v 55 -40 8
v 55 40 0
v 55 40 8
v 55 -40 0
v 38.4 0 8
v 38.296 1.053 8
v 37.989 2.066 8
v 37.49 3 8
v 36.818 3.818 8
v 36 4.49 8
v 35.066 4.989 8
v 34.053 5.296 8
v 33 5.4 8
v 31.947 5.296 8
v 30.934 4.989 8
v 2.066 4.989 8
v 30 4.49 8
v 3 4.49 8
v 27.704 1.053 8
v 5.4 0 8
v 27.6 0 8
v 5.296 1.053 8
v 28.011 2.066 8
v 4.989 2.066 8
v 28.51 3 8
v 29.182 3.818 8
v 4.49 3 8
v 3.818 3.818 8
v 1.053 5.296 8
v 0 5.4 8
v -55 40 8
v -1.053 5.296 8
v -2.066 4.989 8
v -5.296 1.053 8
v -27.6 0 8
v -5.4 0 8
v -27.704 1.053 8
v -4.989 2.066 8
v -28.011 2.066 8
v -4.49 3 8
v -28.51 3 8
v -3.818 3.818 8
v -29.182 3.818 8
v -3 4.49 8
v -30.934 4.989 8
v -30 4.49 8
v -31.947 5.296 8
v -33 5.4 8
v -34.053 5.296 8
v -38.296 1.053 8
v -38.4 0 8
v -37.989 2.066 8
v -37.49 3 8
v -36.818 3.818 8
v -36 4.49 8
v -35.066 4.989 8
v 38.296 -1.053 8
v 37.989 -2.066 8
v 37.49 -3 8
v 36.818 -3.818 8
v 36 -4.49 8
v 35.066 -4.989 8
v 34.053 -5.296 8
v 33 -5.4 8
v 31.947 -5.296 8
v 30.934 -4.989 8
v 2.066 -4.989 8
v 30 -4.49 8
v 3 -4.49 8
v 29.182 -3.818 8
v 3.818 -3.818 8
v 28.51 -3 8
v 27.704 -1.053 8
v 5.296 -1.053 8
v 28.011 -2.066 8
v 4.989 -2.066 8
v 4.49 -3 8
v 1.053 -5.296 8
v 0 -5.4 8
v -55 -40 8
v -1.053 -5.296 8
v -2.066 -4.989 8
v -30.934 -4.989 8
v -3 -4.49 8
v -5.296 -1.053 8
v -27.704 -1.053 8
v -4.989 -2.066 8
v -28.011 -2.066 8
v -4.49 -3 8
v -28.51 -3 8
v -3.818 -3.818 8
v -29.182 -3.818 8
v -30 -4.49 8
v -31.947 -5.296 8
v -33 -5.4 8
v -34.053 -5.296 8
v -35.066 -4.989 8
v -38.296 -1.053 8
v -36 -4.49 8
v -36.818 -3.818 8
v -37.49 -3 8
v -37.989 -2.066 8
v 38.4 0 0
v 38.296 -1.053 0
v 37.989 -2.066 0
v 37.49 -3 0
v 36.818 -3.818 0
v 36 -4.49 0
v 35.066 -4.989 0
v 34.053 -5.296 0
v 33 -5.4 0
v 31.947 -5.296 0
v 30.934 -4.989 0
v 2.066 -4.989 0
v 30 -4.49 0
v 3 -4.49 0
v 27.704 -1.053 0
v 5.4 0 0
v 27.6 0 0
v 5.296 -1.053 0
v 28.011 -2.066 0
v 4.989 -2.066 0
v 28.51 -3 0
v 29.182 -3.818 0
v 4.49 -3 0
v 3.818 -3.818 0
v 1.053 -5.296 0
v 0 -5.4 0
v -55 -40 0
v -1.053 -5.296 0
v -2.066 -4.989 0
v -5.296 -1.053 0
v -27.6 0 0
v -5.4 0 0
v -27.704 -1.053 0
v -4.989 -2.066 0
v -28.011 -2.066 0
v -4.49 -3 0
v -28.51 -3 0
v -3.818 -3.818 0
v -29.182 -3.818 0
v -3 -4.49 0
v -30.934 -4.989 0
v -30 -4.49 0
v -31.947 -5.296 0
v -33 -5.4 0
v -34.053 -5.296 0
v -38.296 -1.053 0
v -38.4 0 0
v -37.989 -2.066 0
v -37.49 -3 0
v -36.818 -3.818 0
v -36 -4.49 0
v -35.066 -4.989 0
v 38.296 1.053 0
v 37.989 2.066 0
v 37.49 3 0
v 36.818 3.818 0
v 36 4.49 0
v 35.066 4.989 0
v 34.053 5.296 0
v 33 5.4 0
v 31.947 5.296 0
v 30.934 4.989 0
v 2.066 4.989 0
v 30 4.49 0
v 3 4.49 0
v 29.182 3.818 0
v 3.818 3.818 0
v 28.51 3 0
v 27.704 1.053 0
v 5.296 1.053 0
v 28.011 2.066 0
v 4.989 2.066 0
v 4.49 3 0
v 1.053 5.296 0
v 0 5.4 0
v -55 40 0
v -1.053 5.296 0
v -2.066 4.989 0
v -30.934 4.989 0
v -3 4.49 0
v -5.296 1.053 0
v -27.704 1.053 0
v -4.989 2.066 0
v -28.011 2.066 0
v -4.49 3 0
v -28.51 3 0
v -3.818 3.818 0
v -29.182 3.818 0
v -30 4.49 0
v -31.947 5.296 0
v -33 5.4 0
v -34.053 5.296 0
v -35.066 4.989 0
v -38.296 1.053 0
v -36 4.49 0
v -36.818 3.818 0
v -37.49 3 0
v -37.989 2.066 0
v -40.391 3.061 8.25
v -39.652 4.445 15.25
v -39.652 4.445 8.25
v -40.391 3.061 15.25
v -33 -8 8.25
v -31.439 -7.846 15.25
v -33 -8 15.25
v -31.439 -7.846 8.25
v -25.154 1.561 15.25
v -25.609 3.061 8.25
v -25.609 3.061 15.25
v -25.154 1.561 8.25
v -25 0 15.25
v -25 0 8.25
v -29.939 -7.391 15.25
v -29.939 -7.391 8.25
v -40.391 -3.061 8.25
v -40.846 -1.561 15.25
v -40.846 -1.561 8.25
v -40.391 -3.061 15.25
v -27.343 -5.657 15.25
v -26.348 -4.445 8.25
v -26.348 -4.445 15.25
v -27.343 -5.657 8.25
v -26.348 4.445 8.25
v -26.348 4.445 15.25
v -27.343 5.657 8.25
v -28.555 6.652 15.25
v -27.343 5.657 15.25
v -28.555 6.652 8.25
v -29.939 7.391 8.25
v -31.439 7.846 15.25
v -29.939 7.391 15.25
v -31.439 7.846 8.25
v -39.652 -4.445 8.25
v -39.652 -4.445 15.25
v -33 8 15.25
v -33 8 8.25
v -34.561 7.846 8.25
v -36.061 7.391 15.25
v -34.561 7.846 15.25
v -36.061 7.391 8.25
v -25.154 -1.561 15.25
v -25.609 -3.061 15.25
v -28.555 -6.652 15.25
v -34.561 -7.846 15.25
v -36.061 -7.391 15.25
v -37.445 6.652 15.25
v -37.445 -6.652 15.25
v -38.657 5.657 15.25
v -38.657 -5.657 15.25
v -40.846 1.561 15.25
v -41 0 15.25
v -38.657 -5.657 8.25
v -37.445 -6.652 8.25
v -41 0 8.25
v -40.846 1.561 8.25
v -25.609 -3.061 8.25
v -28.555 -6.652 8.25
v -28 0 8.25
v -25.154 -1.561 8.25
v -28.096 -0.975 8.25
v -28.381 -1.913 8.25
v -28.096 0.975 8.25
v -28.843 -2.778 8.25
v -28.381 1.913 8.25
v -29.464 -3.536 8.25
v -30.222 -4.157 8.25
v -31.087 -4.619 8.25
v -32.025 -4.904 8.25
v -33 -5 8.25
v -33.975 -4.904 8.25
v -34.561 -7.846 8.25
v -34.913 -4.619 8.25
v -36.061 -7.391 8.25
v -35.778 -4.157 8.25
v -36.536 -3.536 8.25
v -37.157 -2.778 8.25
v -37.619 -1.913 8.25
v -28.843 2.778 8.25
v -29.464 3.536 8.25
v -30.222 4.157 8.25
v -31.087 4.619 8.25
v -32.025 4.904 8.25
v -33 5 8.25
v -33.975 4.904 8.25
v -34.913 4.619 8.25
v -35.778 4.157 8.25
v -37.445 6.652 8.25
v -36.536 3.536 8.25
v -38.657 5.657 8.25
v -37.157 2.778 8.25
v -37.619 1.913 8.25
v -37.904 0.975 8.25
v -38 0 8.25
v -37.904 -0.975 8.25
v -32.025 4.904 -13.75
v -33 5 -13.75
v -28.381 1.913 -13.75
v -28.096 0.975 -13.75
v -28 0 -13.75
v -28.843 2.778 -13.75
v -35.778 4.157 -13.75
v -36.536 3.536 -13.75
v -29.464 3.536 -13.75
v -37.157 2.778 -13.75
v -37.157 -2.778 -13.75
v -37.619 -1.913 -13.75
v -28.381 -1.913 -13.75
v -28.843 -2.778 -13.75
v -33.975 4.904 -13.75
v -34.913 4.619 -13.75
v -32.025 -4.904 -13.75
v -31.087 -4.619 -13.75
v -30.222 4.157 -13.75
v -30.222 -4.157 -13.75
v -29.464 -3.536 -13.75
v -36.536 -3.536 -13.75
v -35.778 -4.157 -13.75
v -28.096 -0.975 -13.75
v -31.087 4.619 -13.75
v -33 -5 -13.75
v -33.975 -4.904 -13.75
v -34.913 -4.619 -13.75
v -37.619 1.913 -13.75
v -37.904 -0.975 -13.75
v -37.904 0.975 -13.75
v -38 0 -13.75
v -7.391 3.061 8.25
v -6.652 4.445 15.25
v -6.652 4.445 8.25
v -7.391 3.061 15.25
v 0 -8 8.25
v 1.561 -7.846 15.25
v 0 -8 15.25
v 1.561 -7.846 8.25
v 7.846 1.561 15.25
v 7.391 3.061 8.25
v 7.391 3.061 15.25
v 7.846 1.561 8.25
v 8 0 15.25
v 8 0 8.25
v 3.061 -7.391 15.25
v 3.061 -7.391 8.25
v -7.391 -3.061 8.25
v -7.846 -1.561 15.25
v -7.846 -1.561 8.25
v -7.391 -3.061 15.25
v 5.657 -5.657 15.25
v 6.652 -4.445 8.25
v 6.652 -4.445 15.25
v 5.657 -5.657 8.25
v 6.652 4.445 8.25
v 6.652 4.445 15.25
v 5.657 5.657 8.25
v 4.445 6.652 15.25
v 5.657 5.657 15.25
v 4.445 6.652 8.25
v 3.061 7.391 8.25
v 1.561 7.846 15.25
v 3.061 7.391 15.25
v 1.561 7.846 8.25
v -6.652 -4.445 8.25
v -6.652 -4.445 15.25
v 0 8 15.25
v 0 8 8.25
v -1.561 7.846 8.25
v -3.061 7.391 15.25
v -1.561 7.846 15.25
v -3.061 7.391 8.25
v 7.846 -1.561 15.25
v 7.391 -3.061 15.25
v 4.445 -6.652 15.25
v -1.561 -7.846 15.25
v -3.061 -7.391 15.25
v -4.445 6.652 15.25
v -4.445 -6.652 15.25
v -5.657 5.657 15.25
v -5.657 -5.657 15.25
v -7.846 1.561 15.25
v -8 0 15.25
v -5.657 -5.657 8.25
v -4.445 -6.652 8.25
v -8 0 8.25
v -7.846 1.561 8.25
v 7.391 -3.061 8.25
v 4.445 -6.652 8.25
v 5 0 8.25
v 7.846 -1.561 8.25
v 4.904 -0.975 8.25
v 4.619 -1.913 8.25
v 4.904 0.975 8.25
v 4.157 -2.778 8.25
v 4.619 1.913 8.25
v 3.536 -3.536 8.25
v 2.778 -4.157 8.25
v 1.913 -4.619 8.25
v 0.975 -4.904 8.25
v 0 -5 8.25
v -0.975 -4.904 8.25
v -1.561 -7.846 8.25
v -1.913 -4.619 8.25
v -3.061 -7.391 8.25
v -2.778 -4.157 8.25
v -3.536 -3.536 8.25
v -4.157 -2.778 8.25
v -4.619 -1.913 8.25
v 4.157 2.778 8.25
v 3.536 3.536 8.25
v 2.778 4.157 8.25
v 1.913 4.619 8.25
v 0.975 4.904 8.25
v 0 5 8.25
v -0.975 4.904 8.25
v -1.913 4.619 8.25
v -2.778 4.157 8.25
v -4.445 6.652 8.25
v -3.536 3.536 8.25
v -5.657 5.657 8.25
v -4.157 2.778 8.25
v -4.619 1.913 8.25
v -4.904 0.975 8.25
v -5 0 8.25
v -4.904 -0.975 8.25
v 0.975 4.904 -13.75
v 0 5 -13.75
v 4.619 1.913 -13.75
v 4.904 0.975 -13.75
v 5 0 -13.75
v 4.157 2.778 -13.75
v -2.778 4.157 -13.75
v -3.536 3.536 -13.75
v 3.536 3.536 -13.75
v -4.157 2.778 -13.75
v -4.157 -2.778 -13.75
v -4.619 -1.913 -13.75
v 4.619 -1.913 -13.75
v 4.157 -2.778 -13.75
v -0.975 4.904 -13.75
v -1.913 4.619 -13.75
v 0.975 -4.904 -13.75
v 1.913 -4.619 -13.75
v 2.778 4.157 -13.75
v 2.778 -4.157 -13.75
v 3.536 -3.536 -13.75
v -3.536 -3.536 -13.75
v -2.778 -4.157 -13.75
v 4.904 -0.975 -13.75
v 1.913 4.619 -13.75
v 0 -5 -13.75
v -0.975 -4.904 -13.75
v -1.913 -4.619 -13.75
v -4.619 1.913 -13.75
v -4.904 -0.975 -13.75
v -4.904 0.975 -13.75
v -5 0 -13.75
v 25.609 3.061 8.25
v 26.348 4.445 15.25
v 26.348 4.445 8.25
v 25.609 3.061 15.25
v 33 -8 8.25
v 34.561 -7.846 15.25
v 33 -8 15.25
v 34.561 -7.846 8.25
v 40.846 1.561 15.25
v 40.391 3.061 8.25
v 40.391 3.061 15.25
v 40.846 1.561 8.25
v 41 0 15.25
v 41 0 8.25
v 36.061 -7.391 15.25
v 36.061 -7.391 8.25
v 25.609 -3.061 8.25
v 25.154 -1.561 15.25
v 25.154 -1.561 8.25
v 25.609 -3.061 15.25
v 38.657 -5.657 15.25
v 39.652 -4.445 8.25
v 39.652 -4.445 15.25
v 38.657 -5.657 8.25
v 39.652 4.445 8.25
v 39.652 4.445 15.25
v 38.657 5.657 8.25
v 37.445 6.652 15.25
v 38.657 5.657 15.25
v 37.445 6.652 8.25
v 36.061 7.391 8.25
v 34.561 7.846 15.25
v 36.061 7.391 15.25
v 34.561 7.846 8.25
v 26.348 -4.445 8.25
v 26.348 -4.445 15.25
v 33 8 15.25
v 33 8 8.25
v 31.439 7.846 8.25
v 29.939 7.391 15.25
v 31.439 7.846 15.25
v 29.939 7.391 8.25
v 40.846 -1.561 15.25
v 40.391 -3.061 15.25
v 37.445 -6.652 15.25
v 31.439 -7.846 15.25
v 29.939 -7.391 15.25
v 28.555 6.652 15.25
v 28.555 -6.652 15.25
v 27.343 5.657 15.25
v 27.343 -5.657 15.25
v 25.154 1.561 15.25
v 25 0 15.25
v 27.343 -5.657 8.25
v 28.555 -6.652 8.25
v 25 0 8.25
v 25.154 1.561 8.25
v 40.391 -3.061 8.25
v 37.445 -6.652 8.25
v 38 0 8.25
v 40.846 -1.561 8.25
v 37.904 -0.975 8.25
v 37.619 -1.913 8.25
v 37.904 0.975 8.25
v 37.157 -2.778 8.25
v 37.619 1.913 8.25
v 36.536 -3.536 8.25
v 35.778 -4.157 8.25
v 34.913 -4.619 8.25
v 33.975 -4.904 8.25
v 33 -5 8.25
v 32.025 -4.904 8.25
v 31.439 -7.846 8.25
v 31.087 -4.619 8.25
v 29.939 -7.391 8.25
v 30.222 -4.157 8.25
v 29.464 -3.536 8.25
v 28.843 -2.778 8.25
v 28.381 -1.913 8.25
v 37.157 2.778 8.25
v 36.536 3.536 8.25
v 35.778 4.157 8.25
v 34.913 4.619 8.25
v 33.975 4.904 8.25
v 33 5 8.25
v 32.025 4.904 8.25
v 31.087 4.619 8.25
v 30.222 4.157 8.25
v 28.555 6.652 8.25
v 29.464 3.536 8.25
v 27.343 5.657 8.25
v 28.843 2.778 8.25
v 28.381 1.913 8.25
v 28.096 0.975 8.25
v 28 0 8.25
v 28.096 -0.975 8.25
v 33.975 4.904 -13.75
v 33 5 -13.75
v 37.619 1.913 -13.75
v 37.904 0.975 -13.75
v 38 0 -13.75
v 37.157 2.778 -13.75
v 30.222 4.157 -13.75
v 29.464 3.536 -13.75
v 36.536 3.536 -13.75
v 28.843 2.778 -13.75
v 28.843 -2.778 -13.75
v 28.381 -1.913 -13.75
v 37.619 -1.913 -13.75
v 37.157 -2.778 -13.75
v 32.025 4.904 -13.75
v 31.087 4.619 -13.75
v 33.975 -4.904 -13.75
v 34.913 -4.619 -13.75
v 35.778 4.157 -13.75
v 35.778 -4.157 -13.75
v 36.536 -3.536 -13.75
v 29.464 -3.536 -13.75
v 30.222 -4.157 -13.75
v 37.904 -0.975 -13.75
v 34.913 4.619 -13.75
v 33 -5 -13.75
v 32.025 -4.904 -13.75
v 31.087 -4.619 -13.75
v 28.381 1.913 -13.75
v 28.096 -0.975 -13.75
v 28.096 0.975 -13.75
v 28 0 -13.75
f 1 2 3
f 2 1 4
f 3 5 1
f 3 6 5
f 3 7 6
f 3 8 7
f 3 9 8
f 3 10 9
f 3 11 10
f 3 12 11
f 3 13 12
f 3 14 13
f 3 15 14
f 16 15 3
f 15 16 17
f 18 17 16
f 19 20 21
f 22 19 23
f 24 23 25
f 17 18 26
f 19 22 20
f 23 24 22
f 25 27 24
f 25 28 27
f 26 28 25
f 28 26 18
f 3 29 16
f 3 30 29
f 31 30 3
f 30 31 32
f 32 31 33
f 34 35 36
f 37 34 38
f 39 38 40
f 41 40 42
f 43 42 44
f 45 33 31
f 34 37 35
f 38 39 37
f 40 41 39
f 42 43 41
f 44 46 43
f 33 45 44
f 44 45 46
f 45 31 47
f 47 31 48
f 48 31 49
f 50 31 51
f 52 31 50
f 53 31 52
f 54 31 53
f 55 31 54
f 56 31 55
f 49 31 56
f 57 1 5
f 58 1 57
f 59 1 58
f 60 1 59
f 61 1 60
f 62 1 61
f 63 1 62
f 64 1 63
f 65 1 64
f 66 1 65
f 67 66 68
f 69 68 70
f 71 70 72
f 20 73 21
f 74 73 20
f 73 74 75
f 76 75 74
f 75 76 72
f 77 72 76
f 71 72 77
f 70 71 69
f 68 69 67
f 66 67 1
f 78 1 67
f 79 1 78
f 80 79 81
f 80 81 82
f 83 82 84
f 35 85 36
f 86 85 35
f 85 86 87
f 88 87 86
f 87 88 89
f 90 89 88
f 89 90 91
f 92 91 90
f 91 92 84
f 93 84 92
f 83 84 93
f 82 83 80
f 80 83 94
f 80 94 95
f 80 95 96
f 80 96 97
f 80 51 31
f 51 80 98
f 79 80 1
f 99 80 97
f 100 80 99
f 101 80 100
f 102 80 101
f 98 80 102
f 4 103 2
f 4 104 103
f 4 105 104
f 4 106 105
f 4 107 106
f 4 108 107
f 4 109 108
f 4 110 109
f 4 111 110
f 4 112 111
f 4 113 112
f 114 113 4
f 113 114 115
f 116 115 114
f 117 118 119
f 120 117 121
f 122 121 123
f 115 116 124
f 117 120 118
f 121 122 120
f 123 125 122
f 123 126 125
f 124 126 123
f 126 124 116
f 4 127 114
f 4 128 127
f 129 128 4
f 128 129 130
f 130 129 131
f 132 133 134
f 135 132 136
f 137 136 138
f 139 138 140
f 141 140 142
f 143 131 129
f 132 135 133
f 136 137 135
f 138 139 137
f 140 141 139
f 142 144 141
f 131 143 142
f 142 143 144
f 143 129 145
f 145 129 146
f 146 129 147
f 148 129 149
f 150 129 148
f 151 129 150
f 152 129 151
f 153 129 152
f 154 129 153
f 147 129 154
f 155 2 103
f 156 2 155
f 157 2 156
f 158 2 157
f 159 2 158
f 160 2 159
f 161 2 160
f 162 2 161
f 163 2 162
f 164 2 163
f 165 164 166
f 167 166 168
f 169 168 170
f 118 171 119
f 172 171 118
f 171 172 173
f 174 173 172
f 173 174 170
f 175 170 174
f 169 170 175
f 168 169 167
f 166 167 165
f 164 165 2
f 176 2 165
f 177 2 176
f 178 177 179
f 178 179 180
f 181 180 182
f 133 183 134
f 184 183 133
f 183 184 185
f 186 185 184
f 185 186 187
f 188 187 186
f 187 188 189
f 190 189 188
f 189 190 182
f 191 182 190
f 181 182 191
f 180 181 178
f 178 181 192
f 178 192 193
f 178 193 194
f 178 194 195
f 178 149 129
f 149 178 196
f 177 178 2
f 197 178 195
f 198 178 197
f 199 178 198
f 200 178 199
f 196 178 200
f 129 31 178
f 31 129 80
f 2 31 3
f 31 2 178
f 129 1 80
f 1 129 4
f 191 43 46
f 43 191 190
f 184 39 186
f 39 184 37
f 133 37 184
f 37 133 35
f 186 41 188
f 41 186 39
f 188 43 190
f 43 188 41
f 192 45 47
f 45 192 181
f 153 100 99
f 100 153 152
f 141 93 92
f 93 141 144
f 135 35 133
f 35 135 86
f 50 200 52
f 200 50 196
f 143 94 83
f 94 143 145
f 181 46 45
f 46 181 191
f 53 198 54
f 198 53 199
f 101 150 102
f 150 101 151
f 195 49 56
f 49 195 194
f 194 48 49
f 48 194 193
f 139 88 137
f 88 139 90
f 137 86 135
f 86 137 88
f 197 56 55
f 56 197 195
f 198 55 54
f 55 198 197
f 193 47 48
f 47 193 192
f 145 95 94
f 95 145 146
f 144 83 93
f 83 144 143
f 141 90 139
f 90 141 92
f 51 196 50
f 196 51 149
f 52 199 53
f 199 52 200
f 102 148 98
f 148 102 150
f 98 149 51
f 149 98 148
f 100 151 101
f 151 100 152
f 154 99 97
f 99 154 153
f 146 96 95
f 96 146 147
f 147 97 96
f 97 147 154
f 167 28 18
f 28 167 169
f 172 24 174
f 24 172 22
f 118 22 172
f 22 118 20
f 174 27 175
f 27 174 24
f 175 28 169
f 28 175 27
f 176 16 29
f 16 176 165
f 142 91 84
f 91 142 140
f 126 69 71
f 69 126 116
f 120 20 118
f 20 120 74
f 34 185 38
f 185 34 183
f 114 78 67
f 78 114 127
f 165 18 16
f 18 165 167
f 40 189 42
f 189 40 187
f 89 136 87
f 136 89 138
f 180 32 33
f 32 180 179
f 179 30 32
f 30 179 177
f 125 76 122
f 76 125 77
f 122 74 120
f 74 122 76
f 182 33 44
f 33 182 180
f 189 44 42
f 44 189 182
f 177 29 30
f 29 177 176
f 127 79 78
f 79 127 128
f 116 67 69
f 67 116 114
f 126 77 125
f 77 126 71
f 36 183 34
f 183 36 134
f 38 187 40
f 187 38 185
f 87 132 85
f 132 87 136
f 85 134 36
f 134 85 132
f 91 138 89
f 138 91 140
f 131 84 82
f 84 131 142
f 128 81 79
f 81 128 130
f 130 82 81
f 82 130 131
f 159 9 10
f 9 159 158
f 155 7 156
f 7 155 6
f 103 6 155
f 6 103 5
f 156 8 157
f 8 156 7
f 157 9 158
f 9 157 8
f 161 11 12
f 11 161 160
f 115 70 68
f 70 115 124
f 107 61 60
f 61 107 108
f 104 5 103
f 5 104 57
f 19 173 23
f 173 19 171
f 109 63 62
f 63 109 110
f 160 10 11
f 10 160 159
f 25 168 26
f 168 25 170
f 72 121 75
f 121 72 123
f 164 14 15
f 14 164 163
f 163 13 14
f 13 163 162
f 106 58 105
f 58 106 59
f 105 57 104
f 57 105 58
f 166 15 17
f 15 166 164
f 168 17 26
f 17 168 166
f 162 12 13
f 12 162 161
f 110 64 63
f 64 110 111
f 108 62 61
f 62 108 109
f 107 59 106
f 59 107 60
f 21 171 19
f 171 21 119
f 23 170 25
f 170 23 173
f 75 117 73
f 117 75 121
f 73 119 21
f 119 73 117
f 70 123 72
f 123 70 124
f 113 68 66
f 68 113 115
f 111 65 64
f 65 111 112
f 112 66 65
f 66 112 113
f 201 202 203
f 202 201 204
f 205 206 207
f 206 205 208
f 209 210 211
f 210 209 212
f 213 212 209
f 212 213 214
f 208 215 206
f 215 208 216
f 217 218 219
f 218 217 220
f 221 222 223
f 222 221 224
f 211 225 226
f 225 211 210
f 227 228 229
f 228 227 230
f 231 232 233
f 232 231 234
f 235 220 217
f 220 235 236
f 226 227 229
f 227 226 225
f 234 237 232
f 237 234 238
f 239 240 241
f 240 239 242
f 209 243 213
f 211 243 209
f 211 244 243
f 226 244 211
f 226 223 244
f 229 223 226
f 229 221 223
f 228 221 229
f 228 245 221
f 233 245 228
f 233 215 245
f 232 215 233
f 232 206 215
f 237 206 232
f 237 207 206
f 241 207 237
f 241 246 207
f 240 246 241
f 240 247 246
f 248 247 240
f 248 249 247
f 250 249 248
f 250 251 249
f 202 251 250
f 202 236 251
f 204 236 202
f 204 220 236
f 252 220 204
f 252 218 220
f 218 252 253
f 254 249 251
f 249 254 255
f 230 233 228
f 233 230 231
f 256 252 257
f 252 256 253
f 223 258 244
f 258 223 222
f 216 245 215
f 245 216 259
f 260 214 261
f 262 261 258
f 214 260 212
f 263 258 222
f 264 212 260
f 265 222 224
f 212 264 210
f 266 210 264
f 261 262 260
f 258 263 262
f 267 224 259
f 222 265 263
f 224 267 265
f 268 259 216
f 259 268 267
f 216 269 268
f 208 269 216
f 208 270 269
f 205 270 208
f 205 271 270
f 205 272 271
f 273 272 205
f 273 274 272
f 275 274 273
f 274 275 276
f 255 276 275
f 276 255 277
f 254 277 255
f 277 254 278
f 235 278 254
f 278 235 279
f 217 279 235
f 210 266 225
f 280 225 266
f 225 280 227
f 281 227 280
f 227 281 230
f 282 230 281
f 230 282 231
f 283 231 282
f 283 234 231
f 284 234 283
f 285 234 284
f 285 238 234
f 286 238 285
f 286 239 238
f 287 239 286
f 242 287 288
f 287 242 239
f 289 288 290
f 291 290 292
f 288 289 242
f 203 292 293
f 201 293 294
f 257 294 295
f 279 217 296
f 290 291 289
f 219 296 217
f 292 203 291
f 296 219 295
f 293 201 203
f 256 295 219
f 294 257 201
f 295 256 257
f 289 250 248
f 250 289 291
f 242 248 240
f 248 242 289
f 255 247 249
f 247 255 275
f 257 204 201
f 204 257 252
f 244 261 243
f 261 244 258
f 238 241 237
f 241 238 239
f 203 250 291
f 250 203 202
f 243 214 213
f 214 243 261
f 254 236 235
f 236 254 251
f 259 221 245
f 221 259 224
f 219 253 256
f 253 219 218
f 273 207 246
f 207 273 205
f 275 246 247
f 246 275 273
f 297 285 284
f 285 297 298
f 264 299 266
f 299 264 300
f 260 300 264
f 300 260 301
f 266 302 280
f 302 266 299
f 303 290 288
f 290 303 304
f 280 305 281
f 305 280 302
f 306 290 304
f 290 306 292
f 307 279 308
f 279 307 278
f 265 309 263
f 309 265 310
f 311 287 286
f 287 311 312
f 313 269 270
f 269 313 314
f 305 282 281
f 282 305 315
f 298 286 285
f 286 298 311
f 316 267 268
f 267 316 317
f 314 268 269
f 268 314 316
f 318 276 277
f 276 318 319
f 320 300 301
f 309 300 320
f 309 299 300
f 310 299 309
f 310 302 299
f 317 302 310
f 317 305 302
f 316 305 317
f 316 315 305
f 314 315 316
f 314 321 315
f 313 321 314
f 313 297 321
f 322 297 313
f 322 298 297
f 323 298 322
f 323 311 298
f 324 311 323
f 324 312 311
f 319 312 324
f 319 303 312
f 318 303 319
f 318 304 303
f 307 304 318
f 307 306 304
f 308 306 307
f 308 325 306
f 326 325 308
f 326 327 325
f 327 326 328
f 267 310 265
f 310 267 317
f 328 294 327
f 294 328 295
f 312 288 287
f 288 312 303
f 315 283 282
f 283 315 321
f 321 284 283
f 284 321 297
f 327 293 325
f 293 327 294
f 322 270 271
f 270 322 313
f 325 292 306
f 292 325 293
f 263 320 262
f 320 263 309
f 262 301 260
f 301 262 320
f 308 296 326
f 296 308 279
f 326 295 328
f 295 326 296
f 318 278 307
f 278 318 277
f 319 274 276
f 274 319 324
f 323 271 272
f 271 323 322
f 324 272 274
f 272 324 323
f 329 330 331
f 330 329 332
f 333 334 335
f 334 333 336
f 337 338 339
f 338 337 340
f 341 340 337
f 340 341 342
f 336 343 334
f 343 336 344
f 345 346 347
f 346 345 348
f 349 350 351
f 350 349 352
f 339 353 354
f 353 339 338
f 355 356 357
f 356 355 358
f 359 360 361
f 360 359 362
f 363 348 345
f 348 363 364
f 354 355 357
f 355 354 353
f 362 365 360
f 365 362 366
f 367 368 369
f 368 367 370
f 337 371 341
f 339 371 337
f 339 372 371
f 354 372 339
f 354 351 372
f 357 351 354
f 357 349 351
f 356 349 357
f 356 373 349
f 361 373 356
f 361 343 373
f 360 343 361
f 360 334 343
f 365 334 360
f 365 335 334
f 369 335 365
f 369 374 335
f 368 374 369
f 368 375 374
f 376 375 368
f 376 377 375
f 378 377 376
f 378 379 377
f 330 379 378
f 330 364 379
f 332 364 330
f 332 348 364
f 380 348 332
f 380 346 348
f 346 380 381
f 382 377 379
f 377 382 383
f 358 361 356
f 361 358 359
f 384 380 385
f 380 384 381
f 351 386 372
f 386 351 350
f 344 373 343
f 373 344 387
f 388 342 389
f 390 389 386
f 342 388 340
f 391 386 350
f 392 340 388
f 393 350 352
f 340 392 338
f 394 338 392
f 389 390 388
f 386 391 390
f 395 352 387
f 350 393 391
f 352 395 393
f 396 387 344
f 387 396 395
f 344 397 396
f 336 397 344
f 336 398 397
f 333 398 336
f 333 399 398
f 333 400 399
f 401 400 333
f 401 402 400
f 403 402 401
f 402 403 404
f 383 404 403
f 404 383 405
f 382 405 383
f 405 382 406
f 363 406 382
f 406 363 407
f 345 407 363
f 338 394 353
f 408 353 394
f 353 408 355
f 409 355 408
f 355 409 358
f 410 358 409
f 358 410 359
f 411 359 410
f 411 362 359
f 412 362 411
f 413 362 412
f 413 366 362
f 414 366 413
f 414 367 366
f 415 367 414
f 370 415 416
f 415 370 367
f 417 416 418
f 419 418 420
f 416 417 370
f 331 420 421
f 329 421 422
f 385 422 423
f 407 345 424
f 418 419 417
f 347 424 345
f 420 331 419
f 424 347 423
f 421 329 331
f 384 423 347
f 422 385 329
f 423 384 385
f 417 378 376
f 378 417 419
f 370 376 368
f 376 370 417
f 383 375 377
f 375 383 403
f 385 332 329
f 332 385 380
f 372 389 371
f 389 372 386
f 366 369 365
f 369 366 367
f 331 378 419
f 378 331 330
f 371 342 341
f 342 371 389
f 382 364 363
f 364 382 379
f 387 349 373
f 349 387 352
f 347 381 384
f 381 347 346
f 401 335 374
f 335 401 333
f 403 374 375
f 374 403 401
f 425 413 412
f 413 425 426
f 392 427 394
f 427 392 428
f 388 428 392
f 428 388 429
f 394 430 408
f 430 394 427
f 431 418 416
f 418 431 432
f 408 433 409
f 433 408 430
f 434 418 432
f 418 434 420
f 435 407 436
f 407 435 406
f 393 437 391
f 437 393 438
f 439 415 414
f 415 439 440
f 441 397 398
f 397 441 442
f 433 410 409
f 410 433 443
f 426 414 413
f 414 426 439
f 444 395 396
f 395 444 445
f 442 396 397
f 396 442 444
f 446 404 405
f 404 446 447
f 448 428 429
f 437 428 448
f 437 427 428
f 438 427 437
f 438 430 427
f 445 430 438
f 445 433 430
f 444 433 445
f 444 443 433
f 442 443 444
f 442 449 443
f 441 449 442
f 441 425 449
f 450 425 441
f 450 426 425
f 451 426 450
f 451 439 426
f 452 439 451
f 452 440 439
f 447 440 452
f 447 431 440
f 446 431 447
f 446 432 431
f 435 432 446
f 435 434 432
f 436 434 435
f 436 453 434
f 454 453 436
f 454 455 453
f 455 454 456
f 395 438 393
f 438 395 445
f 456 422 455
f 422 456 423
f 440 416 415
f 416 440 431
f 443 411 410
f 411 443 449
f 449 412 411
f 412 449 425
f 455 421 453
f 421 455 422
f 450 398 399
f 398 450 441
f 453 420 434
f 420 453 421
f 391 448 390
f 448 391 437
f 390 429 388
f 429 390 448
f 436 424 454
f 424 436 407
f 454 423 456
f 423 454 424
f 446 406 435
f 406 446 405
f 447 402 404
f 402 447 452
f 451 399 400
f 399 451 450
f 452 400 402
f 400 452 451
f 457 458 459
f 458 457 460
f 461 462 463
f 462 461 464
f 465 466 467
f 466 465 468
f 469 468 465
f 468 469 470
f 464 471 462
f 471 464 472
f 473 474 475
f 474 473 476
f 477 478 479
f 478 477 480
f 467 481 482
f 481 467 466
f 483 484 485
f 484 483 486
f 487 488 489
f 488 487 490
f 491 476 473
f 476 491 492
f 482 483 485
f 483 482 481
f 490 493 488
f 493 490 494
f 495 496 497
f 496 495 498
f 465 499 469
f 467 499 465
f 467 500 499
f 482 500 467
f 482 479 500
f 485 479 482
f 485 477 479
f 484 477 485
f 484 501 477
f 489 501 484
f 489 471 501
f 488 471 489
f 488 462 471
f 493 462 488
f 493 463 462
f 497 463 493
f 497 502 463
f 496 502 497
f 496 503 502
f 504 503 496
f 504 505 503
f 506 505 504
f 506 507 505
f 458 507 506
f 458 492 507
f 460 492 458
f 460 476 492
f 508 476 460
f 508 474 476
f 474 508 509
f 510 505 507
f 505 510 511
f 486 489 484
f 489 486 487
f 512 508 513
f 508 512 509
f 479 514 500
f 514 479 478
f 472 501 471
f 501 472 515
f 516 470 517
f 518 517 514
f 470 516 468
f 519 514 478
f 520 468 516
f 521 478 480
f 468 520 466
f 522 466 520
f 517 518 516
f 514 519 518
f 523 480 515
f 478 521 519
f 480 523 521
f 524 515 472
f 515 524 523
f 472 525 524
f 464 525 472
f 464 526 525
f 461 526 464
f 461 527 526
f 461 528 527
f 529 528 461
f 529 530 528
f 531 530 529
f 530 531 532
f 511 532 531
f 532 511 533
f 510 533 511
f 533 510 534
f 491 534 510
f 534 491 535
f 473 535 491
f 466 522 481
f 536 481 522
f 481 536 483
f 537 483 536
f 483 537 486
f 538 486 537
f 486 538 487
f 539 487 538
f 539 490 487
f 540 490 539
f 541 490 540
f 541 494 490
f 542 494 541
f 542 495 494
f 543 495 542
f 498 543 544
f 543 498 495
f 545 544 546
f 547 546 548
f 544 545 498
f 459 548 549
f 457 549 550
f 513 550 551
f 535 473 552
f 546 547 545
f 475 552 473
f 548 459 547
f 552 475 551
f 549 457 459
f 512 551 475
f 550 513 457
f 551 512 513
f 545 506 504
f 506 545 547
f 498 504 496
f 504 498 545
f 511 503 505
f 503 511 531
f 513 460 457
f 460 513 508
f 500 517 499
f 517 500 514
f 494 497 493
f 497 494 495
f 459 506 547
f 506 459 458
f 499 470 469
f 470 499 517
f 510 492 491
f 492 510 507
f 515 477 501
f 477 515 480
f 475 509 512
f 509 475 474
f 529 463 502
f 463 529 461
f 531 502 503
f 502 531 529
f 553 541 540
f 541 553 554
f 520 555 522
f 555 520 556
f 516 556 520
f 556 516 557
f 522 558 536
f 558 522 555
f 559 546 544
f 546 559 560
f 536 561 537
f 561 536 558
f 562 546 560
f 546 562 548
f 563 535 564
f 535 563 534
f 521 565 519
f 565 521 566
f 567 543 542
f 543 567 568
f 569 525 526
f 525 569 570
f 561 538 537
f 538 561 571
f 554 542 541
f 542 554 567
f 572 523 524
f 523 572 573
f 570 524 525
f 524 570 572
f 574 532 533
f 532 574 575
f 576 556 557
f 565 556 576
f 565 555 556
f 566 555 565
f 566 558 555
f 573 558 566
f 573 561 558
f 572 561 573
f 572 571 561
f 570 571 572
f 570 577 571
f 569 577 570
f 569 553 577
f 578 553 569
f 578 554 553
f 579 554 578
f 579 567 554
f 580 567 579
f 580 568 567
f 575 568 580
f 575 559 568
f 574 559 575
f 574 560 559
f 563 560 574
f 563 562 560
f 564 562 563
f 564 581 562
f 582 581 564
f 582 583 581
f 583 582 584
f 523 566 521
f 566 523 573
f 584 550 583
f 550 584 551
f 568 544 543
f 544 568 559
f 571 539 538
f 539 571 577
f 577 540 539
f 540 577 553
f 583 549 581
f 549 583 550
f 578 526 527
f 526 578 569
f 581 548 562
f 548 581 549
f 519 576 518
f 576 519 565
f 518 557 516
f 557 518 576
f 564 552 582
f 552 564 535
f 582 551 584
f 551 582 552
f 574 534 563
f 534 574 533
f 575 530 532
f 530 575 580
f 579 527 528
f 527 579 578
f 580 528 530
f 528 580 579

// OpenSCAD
$fn = 32;

// ------------------------------------------------------------------------
// Bolted plate: 110 x 80 x 8 mm plate, 3 fasteners
// Every part is its own module, assembly() places them once.
// ------------------------------------------------------------------------

// --- part 1 ---
module plate() {
  difference() {
    translate([-55, -40, 0]) cube([110, 80, 8]);
    translate([-33, 0, -1]) cylinder(h = 10, d = 10.8);
    translate([0, 0, -1]) cylinder(h = 10, d = 10.8);
    translate([33, 0, -1]) cylinder(h = 10, d = 10.8);
  }
}

// --- part 2 ---
module bolt1() {
  cylinder(h = 7, d = 16);
  translate([0, 0, -22]) cylinder(h = 22, d = 10);
}

// --- part 3 ---
module bolt2() {
  cylinder(h = 7, d = 16);
  translate([0, 0, -22]) cylinder(h = 22, d = 10);
}

// --- part 4 ---
module bolt3() {
  cylinder(h = 7, d = 16);
  translate([0, 0, -22]) cylinder(h = 22, d = 10);
}

// --- assembly ---
module assembly() {
  translate([0, 0, 0]) rotate([0, 0, 0]) plate();
  translate([-33, 0, 8.25]) rotate([0, 0, 0]) bolt1();
  translate([0, 0, 8.25]) rotate([0, 0, 0]) bolt2();
  translate([33, 0, 8.25]) rotate([0, 0, 0]) bolt3();
}

assembly();
